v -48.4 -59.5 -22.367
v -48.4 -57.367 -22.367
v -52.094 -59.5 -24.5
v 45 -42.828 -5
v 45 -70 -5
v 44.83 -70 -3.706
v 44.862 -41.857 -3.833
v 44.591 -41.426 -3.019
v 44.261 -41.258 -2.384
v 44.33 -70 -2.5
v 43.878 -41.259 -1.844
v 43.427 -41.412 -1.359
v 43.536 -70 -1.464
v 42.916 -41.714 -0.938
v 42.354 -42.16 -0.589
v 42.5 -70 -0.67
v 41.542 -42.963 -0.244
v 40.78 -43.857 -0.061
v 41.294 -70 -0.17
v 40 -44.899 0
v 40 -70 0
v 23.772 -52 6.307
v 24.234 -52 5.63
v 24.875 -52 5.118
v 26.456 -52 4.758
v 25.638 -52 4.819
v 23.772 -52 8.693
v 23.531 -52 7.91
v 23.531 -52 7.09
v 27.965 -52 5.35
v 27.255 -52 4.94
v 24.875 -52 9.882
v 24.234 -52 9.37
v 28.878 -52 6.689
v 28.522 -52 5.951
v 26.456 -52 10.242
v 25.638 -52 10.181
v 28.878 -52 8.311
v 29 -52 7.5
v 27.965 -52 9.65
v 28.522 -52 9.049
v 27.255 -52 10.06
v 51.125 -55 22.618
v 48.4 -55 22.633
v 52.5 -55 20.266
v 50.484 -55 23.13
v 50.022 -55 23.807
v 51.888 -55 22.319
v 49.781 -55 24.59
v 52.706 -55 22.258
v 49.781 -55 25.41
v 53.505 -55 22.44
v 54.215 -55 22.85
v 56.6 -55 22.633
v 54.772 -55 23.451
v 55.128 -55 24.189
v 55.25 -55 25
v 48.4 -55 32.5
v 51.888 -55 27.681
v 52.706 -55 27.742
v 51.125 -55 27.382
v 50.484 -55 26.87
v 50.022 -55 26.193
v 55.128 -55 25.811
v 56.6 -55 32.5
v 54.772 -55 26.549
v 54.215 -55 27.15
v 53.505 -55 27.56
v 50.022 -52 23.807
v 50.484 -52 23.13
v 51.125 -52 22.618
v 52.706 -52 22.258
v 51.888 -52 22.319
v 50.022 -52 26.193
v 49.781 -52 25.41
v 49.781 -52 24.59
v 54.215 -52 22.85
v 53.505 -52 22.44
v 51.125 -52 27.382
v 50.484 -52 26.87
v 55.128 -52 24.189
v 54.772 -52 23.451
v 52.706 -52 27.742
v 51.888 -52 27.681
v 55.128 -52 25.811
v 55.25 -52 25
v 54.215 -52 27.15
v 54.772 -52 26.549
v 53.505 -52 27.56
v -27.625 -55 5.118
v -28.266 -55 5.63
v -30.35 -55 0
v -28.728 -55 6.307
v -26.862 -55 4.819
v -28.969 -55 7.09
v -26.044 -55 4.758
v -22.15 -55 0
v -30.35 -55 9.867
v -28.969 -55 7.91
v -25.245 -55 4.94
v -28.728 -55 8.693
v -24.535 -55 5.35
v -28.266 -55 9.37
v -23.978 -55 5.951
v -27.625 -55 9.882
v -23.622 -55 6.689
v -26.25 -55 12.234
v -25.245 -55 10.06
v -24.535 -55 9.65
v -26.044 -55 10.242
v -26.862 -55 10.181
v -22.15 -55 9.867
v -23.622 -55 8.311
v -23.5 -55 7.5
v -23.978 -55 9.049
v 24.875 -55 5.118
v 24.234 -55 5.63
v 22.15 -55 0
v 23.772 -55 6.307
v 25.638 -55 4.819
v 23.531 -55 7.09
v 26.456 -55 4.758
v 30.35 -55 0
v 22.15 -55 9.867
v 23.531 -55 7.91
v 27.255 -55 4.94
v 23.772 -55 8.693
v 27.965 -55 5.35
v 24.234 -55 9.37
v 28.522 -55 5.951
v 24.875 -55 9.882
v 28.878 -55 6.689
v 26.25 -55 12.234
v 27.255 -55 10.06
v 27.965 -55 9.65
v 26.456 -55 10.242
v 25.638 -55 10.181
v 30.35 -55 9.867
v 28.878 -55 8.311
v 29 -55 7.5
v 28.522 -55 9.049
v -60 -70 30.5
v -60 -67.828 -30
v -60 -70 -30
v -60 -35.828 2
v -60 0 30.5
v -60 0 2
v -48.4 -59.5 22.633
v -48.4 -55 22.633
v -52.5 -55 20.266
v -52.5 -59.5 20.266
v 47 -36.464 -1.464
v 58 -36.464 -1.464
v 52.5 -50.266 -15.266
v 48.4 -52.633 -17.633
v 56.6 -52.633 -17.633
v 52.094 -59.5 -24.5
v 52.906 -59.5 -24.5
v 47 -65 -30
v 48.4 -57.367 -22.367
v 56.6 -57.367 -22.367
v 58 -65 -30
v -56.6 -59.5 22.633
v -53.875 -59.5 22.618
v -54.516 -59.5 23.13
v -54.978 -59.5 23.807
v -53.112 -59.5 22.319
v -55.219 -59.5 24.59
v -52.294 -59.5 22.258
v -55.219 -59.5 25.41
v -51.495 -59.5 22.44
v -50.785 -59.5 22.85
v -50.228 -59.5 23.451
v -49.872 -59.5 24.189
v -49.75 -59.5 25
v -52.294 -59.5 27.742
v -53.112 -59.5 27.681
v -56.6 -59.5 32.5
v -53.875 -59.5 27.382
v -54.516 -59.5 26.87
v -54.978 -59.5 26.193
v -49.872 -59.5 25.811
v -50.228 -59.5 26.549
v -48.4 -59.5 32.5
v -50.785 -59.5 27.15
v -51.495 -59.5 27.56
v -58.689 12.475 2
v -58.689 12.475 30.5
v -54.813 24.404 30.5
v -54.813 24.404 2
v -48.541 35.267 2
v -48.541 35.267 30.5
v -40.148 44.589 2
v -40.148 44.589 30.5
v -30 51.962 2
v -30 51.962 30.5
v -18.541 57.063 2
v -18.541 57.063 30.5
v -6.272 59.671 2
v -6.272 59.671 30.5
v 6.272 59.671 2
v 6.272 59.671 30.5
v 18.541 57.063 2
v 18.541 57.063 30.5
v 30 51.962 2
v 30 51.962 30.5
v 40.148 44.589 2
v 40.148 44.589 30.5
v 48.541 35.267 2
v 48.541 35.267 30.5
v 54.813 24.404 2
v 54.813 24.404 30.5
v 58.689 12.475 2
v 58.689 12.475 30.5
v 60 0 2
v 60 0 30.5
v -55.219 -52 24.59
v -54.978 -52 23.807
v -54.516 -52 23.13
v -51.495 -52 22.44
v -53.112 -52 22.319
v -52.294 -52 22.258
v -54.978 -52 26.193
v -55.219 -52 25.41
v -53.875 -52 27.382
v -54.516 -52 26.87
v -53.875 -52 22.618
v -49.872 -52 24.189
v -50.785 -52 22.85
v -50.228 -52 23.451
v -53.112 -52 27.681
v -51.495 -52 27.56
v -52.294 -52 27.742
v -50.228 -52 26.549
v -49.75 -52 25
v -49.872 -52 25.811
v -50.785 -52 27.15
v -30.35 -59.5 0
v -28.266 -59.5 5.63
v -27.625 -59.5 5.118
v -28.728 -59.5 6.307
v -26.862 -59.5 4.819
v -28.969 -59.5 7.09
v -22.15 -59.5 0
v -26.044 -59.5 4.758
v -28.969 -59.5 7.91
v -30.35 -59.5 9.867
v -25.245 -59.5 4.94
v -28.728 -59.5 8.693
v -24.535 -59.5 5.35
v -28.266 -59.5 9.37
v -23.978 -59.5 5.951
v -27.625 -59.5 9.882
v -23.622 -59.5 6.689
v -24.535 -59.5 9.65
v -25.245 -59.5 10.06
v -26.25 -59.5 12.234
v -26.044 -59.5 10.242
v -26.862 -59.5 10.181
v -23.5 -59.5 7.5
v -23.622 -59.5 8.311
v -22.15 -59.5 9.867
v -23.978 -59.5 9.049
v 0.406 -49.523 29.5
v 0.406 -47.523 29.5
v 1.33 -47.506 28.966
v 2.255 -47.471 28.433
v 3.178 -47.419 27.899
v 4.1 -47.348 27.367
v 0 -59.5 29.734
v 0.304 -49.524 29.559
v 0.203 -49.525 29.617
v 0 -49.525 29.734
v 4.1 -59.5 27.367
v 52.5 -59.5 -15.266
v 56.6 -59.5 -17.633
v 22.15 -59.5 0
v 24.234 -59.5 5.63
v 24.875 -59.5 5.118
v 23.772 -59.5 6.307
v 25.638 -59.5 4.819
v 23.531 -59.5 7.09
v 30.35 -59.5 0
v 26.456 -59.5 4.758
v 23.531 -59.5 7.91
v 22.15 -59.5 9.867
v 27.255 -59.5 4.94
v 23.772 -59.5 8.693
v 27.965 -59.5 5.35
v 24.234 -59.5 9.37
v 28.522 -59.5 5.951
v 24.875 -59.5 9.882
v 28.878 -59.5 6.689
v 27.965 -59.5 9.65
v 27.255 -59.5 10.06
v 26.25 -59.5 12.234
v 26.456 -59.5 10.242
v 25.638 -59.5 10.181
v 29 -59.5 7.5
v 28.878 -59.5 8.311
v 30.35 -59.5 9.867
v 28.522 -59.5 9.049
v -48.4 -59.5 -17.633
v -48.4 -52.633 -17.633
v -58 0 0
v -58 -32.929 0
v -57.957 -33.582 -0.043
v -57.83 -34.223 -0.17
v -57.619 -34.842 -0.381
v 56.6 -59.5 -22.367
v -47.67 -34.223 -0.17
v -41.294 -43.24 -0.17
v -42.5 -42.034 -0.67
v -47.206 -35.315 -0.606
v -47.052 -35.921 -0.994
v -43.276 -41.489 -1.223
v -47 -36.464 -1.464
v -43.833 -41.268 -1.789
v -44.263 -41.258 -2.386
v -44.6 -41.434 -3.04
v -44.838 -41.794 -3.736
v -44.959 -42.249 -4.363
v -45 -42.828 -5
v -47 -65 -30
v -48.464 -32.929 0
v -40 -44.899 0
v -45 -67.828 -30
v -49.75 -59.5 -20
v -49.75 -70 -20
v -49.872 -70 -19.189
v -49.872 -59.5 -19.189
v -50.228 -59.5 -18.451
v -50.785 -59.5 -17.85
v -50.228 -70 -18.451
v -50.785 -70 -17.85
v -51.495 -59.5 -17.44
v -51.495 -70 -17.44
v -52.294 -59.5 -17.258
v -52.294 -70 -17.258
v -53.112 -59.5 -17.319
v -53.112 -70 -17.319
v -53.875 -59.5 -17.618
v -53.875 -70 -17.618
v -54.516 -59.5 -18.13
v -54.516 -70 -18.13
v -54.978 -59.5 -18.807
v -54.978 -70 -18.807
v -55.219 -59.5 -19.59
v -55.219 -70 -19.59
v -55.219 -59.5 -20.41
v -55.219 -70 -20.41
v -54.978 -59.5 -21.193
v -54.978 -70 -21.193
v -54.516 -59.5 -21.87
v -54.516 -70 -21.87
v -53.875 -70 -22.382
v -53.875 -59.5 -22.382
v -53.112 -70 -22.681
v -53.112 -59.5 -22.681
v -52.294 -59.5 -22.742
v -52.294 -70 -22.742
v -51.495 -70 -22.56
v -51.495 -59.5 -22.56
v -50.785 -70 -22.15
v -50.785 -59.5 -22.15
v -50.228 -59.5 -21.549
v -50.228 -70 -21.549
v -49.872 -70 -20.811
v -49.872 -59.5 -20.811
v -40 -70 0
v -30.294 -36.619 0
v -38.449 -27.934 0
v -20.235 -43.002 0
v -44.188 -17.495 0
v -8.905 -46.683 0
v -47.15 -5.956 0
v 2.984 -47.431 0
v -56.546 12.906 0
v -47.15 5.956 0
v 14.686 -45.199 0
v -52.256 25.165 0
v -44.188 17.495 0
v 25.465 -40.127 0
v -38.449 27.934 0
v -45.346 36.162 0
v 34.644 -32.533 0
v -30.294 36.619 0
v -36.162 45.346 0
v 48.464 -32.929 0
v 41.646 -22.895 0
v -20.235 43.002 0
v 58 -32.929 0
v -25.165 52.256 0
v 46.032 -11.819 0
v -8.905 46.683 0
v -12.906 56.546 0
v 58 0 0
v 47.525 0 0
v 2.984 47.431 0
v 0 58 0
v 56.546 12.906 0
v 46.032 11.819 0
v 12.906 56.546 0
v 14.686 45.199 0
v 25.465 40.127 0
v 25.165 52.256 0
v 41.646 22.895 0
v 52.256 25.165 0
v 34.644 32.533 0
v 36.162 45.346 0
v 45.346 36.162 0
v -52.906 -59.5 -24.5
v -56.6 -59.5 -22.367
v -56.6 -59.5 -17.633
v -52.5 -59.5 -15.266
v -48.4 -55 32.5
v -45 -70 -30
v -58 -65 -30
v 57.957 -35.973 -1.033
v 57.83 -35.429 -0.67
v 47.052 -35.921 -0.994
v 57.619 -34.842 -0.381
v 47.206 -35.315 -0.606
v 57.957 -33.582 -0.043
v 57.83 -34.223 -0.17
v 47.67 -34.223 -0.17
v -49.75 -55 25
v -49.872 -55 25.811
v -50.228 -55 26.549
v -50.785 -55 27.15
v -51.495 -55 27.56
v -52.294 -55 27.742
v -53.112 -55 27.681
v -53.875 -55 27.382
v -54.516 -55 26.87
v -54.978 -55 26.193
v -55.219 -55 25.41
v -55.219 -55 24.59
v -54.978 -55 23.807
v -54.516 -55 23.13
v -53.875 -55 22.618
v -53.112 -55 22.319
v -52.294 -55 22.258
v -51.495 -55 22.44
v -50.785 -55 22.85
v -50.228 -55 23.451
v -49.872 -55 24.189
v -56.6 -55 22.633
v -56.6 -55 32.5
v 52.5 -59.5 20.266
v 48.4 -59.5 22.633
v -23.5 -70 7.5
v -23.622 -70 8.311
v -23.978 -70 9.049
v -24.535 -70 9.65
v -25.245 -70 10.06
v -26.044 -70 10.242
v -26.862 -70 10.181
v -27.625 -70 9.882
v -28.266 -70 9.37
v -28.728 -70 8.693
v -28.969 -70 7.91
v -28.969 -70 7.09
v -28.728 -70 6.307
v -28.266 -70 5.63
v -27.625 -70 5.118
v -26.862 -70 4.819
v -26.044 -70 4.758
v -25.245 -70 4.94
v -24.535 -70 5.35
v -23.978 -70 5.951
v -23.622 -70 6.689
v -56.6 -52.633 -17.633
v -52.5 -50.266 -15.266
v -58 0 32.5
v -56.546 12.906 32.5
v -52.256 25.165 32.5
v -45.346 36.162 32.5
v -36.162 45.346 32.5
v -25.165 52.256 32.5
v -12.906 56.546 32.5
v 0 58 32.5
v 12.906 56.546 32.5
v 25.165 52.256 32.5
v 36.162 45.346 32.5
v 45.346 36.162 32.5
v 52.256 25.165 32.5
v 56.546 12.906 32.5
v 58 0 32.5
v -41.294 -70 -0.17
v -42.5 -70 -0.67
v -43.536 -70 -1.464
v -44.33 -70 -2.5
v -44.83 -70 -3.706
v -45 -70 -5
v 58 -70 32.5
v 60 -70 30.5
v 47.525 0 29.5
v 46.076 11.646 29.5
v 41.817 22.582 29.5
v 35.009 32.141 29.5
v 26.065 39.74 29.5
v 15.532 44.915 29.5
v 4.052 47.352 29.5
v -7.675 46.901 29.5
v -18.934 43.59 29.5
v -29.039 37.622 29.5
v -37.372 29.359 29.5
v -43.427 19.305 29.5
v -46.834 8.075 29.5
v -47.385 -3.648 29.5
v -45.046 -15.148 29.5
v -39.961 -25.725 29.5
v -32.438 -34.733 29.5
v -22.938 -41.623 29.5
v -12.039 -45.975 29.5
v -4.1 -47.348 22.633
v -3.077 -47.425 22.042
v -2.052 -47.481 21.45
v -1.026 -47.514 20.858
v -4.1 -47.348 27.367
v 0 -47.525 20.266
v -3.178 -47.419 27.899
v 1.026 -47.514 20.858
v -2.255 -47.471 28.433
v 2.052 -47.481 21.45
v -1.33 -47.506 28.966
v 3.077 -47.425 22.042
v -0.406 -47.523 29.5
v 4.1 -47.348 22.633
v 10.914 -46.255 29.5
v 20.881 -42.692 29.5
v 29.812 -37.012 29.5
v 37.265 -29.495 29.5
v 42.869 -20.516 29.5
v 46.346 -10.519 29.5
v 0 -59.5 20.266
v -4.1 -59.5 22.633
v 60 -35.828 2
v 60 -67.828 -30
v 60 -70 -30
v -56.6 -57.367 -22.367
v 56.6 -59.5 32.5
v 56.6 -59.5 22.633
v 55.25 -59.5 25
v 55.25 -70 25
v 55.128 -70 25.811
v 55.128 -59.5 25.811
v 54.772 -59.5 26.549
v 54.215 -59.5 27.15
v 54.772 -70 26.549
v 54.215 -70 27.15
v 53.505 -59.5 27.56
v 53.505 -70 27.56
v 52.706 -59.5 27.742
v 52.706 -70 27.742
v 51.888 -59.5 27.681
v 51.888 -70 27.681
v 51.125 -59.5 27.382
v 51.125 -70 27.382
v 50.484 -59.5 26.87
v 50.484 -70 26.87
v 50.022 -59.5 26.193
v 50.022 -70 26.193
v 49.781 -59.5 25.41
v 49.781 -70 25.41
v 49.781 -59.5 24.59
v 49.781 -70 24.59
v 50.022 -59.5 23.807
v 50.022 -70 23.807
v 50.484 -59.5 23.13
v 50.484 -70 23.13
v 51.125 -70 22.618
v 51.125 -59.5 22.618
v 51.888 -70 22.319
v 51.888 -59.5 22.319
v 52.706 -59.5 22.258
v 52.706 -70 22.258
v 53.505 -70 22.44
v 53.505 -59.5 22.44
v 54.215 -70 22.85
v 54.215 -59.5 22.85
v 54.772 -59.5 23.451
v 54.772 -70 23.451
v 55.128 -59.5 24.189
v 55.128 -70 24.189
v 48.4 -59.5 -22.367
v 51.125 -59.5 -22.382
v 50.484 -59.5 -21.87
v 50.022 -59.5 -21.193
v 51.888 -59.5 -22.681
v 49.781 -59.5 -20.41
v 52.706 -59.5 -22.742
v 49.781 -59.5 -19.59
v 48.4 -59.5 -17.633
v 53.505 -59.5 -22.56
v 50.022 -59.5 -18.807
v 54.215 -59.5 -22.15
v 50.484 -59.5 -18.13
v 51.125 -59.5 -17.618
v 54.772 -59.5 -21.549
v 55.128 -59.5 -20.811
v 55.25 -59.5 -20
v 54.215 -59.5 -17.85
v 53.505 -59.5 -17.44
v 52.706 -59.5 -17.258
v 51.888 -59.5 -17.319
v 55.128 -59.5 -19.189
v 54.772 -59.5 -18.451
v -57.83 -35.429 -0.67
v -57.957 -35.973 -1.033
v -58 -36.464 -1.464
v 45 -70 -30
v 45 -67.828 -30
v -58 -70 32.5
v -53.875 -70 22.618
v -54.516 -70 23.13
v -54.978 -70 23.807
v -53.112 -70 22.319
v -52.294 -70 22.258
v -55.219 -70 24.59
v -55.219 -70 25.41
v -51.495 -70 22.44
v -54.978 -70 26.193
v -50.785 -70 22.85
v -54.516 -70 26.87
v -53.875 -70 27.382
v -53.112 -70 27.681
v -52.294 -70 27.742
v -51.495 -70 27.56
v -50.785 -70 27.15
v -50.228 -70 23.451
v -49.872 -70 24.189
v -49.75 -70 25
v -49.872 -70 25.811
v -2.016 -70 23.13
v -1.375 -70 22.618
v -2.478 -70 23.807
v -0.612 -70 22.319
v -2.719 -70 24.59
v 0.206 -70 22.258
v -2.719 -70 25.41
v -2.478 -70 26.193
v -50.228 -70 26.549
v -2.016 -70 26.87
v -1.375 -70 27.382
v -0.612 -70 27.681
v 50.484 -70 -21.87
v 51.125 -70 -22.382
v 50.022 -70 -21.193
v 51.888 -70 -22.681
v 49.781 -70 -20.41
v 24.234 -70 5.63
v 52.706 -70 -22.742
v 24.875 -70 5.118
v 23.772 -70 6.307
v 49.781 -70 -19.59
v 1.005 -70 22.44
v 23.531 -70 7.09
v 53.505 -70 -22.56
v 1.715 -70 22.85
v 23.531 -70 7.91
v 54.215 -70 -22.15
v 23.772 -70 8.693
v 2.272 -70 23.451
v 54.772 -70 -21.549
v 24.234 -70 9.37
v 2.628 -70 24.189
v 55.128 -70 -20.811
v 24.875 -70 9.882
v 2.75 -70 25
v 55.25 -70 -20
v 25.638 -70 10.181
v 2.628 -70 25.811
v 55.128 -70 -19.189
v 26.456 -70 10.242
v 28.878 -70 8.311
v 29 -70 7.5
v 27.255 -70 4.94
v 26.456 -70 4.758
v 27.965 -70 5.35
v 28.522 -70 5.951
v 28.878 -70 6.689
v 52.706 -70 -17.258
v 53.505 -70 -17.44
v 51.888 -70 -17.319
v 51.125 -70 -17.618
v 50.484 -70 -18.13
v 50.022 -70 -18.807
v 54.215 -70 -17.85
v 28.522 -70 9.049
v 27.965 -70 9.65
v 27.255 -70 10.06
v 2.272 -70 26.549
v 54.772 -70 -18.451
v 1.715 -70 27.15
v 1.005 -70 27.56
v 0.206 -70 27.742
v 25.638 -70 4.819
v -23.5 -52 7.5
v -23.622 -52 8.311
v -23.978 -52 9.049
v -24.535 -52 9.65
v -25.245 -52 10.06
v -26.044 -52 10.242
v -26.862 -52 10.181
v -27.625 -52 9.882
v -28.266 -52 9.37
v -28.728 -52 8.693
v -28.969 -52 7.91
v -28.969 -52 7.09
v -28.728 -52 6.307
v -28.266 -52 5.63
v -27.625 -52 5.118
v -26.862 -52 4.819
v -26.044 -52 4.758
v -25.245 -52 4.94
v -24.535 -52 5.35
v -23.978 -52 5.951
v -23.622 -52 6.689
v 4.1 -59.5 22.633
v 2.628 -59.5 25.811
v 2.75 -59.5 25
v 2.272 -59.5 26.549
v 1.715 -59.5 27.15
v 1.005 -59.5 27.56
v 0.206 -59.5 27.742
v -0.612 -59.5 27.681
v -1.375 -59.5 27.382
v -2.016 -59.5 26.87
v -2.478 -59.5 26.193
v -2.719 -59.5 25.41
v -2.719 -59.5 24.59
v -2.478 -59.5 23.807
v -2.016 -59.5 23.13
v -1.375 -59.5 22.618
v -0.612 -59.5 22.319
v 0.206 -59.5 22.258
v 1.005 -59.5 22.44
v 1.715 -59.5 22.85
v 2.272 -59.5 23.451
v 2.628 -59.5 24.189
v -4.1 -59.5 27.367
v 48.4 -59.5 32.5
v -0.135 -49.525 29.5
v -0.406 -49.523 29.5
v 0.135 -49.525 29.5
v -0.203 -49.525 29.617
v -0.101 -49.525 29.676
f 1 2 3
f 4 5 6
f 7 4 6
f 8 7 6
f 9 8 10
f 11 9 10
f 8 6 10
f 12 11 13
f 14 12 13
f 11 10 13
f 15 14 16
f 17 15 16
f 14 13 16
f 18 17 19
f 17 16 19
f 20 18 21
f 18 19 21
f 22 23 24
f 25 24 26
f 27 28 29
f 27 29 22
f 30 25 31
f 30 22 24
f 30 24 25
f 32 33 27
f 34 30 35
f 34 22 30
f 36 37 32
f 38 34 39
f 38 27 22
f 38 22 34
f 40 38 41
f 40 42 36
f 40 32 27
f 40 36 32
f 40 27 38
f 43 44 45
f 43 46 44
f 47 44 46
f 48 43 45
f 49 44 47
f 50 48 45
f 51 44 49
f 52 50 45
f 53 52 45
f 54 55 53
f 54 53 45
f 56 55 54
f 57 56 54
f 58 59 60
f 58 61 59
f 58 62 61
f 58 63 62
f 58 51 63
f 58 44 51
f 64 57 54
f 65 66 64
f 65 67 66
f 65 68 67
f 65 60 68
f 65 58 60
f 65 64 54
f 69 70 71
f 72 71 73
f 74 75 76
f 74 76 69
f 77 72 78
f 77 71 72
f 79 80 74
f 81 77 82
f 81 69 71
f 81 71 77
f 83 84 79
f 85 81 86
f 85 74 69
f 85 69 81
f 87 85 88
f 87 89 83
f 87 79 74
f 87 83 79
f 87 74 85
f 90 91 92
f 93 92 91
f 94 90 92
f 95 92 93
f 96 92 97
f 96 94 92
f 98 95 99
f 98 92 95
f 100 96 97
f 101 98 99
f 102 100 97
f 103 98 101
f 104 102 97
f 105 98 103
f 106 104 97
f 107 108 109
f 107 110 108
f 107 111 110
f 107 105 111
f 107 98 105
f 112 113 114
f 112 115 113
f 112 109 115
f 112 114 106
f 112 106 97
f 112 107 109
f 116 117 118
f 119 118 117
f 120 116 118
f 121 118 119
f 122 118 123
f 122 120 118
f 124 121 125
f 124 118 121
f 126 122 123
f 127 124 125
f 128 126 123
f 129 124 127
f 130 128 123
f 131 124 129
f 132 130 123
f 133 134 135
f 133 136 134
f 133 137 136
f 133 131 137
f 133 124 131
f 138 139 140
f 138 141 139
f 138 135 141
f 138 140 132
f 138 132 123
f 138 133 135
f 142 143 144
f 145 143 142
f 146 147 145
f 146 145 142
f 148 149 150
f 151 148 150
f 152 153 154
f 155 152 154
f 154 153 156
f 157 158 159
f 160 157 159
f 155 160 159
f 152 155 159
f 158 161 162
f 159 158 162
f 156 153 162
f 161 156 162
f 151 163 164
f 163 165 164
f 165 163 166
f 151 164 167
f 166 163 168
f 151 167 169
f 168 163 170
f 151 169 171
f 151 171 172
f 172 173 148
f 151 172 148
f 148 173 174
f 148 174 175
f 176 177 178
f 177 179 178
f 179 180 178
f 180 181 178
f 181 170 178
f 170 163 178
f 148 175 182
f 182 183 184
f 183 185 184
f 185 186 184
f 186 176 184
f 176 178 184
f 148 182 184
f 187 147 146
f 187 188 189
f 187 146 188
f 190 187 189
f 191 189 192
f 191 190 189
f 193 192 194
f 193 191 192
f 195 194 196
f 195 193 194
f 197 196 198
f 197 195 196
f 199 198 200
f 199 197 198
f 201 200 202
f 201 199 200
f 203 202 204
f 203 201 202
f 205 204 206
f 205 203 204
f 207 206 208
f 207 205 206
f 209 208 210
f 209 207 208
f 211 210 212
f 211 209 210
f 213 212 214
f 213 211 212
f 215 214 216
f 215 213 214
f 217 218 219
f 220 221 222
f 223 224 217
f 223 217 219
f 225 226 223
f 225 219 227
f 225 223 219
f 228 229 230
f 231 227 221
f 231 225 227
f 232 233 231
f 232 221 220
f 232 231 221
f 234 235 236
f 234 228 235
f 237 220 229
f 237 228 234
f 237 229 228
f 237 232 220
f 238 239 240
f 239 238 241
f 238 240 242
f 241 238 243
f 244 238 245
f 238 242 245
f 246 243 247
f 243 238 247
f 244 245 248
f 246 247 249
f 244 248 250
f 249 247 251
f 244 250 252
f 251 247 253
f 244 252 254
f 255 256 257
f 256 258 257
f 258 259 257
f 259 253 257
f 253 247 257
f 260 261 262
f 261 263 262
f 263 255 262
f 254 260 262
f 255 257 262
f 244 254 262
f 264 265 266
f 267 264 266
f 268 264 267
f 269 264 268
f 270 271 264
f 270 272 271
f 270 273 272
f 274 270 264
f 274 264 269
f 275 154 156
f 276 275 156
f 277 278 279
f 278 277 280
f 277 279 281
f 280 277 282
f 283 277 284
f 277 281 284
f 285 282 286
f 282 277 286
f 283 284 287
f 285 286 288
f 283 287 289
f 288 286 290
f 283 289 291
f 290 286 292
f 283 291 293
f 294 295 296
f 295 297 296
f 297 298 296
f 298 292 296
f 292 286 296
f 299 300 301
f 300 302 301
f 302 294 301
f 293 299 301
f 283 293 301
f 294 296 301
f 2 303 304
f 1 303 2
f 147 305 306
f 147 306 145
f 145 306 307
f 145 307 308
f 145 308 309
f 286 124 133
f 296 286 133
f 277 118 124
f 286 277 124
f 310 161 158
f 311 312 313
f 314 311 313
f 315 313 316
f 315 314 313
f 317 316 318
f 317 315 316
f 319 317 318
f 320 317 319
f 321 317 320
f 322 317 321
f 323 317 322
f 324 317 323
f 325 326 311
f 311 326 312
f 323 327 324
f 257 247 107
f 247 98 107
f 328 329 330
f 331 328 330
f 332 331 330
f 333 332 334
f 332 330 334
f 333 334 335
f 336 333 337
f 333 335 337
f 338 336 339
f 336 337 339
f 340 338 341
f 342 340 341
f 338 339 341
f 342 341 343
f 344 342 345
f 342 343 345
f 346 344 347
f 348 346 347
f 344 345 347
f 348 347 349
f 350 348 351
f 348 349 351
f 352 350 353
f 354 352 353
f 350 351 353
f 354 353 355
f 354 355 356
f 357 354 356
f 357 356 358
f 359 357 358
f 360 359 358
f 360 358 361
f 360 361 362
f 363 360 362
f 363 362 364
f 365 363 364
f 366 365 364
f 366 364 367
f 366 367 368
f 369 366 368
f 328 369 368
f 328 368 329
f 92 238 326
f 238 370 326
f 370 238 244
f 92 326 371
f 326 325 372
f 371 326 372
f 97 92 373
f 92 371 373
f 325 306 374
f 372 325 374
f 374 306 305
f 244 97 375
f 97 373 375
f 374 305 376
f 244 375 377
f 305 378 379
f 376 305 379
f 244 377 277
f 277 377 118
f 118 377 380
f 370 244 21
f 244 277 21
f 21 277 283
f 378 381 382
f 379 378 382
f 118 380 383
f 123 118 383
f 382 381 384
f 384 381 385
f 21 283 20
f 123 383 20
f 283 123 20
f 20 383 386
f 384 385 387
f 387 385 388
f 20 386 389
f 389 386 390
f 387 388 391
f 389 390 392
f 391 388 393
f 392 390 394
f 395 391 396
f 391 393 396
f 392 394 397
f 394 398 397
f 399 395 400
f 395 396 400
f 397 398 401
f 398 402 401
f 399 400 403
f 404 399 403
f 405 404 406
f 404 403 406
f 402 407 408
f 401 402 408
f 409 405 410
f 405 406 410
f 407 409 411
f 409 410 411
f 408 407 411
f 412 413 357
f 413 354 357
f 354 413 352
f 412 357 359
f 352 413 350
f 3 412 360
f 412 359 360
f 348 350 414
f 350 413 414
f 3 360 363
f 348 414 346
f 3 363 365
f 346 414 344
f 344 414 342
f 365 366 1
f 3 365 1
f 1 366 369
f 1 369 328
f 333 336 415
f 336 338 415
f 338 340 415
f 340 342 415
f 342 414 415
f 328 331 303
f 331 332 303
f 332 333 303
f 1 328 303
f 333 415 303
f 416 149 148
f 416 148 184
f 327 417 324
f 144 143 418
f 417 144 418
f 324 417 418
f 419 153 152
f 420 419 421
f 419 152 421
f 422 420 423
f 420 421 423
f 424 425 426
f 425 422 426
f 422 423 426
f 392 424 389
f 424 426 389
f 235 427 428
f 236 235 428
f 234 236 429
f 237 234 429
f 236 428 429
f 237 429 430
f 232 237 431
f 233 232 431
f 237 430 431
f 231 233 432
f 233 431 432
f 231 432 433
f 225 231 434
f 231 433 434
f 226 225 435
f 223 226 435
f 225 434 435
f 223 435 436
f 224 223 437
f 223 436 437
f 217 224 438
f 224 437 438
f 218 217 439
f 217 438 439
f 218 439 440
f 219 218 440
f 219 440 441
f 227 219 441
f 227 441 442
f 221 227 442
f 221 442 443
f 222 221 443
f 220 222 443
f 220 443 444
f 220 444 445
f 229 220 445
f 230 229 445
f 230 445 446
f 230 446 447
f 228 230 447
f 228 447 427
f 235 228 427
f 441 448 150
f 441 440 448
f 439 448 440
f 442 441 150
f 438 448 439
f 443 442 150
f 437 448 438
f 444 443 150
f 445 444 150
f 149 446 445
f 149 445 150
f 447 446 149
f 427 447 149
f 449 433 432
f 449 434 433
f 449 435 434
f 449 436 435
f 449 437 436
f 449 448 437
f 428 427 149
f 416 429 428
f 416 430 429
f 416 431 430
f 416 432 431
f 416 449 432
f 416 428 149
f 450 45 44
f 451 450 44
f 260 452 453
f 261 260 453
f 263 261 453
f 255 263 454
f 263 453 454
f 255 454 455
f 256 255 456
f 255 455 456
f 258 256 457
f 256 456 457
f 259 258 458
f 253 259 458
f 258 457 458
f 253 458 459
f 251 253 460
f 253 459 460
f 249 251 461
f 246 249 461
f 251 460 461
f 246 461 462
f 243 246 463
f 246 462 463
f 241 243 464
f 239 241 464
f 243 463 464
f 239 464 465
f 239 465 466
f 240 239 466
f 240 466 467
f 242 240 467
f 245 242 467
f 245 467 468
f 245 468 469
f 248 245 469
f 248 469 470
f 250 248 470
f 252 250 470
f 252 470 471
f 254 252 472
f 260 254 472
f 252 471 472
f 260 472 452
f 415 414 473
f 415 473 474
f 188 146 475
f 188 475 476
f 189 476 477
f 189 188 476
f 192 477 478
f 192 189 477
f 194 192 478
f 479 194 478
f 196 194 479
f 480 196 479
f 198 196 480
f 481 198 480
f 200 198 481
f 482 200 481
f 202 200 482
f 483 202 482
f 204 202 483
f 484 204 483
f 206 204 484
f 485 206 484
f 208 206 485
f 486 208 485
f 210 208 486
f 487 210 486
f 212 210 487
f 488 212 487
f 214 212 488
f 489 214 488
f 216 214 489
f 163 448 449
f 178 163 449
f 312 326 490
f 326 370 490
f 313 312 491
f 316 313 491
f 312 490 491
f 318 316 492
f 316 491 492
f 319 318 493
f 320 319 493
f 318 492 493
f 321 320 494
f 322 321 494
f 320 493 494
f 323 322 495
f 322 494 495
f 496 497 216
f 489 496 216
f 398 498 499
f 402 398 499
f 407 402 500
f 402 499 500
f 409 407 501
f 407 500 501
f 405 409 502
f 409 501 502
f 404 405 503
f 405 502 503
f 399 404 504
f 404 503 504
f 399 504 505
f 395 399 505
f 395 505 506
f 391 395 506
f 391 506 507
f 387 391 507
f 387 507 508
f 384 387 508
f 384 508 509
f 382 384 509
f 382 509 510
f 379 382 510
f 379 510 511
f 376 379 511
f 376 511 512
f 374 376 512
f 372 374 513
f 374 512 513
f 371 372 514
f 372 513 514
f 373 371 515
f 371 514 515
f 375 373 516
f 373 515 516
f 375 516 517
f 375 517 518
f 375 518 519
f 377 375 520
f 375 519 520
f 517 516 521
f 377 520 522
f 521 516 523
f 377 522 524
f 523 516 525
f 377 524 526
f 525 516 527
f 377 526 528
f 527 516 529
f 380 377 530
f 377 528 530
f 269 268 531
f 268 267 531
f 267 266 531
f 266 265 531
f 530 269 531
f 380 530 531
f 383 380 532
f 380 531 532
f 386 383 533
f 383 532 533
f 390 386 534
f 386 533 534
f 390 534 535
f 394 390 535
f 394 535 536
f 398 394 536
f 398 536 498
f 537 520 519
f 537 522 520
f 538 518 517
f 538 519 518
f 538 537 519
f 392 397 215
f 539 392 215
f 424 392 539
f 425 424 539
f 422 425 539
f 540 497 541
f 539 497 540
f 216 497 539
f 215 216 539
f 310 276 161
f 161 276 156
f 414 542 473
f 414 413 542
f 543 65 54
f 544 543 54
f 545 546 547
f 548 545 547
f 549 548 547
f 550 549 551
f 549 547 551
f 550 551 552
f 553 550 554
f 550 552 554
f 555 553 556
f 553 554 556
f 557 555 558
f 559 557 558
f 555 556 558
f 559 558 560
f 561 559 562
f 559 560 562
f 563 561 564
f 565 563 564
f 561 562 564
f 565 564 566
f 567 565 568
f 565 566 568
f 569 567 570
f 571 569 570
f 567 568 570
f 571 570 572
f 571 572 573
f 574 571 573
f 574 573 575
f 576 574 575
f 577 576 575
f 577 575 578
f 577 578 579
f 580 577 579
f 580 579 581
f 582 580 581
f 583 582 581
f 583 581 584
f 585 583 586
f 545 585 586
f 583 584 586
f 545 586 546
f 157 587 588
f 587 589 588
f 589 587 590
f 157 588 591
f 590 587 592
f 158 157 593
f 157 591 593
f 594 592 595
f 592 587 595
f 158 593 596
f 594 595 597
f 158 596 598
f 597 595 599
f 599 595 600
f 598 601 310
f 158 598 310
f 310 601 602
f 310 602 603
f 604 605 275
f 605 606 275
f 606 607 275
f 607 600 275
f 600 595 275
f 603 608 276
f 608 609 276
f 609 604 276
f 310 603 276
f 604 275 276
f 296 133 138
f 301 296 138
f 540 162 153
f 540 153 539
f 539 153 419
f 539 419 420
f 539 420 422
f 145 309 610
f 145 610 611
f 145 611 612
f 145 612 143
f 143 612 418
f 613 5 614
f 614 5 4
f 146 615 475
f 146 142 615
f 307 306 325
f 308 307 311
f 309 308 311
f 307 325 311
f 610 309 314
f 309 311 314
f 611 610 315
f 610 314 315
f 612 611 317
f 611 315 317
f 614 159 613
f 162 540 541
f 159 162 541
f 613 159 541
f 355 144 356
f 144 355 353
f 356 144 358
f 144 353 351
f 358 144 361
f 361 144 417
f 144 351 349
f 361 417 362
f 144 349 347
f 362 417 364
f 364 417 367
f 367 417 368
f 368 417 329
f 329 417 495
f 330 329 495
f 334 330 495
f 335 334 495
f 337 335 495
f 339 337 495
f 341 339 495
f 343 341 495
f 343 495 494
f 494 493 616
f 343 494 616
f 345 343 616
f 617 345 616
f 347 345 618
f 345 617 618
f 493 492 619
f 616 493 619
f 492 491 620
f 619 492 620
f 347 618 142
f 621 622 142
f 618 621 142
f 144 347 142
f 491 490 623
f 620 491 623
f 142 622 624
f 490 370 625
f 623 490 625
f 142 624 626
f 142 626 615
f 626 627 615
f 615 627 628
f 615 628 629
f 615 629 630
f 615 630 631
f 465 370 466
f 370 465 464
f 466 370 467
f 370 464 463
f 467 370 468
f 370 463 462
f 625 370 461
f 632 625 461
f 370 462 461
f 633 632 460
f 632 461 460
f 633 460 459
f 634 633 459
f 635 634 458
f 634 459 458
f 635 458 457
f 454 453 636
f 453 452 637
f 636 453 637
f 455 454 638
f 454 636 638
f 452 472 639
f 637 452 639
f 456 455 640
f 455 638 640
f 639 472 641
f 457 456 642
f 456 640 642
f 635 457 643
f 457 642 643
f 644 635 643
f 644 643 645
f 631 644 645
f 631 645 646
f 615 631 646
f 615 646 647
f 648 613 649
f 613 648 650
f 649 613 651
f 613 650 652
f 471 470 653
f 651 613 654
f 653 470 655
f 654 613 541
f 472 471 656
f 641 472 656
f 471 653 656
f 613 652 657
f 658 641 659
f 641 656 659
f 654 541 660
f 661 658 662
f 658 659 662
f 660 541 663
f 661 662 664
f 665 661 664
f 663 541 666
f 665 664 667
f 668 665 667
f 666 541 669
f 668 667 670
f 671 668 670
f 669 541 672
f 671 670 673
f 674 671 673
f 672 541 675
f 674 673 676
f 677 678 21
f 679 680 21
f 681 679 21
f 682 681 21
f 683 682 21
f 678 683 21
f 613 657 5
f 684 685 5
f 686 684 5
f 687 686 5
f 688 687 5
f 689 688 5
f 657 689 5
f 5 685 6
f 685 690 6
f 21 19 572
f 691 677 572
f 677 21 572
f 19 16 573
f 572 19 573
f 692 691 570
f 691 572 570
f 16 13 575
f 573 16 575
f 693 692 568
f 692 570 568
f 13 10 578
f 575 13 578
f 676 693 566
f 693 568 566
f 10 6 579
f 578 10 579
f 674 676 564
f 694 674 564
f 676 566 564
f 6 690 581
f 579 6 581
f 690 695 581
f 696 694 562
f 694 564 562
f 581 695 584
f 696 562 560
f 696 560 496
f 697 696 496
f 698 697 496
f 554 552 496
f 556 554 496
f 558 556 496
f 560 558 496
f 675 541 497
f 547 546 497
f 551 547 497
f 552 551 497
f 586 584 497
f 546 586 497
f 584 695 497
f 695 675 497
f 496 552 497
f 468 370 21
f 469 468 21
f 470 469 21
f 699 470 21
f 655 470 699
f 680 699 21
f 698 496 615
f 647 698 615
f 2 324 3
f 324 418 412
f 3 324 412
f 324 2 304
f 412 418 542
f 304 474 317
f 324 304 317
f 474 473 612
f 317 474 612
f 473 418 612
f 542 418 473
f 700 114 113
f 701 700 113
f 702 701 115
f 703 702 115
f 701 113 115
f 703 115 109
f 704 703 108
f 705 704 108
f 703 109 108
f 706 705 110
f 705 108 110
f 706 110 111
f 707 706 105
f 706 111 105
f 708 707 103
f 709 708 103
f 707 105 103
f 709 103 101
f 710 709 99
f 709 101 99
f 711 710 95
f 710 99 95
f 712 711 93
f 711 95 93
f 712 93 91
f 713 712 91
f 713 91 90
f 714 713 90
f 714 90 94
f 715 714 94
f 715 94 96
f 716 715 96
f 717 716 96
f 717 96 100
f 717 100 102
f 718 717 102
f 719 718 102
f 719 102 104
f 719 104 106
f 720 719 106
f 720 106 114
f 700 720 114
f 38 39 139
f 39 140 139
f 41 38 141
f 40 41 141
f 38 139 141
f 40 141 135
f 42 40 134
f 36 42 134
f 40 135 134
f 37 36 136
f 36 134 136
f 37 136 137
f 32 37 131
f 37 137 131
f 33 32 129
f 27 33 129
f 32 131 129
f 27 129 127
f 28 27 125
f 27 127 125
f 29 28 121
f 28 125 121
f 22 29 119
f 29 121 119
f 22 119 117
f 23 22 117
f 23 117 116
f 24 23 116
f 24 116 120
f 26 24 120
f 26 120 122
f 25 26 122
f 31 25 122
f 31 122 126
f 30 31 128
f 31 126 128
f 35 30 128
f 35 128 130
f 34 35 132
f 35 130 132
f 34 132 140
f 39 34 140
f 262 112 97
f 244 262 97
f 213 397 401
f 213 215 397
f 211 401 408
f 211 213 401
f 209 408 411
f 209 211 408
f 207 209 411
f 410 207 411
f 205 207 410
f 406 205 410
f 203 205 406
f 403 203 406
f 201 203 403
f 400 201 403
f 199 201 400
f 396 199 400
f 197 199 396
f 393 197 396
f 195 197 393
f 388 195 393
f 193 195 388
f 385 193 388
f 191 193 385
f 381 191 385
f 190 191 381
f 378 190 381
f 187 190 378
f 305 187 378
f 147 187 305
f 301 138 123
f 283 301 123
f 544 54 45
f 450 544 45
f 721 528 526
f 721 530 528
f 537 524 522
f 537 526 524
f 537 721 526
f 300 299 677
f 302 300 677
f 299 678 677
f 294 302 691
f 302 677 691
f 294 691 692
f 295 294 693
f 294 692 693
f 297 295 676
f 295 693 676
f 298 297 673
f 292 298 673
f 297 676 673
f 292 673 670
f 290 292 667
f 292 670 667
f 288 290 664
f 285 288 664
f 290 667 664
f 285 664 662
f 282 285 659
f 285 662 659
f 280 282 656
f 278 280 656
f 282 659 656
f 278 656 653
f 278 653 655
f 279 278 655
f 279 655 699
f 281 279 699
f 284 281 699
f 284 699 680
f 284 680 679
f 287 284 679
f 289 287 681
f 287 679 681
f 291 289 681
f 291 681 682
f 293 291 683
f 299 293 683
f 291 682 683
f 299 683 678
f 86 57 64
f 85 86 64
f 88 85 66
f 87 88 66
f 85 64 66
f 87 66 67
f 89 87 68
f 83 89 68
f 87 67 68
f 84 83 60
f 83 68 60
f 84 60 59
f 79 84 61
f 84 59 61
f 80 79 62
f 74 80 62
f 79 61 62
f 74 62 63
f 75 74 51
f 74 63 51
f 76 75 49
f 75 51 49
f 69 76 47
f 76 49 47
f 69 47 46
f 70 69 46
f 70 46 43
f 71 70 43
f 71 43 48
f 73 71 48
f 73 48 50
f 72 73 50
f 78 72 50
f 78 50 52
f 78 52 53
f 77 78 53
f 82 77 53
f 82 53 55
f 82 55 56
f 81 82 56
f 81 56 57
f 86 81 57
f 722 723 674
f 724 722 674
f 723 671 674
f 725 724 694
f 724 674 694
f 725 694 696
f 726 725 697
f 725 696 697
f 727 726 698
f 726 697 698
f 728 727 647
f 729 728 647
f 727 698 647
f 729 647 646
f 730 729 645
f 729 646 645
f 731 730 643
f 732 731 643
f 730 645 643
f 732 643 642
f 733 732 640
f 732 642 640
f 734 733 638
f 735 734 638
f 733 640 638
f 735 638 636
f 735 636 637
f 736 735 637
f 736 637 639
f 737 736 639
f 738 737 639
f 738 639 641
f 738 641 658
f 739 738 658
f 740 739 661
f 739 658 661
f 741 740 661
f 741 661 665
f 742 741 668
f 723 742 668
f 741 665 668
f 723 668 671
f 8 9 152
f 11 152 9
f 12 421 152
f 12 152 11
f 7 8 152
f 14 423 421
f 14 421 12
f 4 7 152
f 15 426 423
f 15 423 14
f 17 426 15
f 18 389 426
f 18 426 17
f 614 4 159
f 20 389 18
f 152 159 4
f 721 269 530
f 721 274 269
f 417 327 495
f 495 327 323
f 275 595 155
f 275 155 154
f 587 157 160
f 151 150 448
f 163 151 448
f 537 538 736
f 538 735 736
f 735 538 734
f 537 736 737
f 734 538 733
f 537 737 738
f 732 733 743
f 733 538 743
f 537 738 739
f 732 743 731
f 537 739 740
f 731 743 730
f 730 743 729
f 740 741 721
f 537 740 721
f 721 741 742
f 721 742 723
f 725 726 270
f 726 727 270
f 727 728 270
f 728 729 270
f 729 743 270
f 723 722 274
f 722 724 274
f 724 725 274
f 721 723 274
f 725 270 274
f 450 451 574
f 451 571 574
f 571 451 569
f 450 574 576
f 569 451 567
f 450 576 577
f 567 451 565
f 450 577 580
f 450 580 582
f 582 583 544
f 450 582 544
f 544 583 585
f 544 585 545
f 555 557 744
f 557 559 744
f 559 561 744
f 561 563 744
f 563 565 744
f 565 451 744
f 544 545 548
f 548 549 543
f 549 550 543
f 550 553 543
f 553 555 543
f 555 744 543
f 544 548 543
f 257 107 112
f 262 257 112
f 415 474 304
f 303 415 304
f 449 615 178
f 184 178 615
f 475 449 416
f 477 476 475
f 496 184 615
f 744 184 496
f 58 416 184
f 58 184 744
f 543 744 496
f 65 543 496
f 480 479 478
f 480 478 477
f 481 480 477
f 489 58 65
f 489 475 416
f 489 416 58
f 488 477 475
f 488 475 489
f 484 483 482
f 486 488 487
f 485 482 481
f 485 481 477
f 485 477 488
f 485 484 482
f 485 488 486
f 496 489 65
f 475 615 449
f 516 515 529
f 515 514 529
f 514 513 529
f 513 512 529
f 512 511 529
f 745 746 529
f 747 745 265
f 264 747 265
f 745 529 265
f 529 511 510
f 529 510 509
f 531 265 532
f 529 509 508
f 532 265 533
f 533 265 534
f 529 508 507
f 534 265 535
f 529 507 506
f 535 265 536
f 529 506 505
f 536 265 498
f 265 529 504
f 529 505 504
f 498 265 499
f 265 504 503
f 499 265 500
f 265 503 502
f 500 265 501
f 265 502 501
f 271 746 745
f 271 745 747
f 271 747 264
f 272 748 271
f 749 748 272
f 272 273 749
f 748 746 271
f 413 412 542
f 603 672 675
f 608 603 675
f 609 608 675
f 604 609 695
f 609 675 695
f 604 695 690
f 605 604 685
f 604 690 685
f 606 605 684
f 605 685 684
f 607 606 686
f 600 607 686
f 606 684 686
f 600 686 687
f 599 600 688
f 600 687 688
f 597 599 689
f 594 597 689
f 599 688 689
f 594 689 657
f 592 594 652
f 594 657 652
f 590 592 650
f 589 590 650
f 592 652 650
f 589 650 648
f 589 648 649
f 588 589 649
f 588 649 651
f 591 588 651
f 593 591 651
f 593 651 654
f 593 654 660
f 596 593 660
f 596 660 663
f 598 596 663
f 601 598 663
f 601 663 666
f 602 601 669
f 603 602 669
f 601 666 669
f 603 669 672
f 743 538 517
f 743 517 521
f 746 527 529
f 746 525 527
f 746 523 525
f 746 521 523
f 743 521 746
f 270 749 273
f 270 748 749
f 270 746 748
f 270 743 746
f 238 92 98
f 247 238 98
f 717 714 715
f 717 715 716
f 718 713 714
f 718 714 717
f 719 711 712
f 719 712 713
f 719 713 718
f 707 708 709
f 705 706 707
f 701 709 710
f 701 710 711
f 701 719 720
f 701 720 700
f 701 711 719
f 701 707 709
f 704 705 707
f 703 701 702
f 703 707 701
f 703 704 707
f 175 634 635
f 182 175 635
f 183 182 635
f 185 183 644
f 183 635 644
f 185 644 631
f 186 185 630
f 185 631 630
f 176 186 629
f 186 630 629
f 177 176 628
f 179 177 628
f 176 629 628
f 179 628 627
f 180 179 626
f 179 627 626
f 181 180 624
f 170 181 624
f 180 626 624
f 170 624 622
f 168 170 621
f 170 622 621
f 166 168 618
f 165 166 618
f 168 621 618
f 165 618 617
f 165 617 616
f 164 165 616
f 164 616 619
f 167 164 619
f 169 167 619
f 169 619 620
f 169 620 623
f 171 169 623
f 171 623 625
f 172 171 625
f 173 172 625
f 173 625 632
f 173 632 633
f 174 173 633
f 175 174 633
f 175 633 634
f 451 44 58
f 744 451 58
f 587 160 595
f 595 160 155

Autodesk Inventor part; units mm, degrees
ref_plane "YZ Plane" through (0, 0, 0) normal (1, 0, 0) x (0, 1, 0)
ref_plane "XZ Plane" through (0, 0, 0) normal (0, 1, 0) x (-1, 0, 0)
sketch "Sketch1" plane through (0, 0, 0) normal (0, 0, 1) x (1, 0, 0)
  circle A0 centre (0, 0) radius 47.525
  arc A1 (60, 0) -> (-60, 0) centre (0, 0) ccw
  line L0 (-60, 0) -> (-60, -70)
  line L1 (-60, -70) -> (60, -70)
  line L2 (60, -70) -> (60, 0)
  dimension "d0" = 95.05
  dimension "d2" = 70
  dimension "d43" = 60
extrude "Extrusion1" add sketch "Sketch1" along normal blind 32.5
sketch "Sketch2" plane through (0, 0, 0) normal (0, 0, -1) x (-1, 0, 0)
  circle A0 centre (0, 0) radius 47.525 projected
  circle A1 centre (0, 0) radius 45.525
  dimension "d5" = 2
extrude "Extrusion2" add sketch "Sketch2" against normal blind 1
sketch "Sketch3" plane through (0, 0, 32.5) normal (0, 0, 1) x (1, 0, 0)
  arc A0 (60, 0) -> (-60, 0) centre (0, 0) ccw construction
  line L0 (0, 0) -> (0, 55) construction
  circle A1 centre (0, 55) radius 2.6
  circle A2 centre (-52.3081, 16.9959) radius 2.6
  circle A3 centre (-32.3282, -44.4959) radius 2.6
  circle A4 centre (32.3282, -44.4959) radius 2.6
  circle A5 centre (52.3081, 16.9959) radius 2.6
  dimension "d8" = 5.2
  dimension "d9" = 55
  dimension "d12" = 360
extrude "Extrusion3" cut sketch "Sketch3" against normal through all
sketch "Sketch7" plane through (-60, -70, 0) normal (-1, 0, 0) x (0, 0, 1)
  line L0 (0, 0) -> (32.5, 0) projected
  line L1 (0, 0) -> (-30, 0)
  line L2 (-30, 0) -> (-30, 5)
  line L3 (0, 70) -> (0, 0) projected
  line L4 (-30, 5) -> (0, 35)
  line L5 (0, 0) -> (0, 35)
  dimension "d32" = 30
  dimension "d33" = 5
  dimension "d34" = 135
extrude "Extrusion7" add sketch "Sketch7" against normal blind 15
mirror "Mirror1" about plane through (0, 0, 0) normal (1, 0, 0) of "Extrusion7"
sketch "Sketch5" plane through (-60, -70, 0) normal (0, -1, 0) x (1, 0, 0)
  circle A0 centre (7.5, 25) radius 2.75
  circle A1 centre (112.5, 25) radius 2.75
  circle A2 centre (86.25, 7.5) radius 2.75
  circle A3 centre (33.75, 7.5) radius 2.75
  circle A4 centre (60, 25) radius 2.75
  line L0 (7.5, 25) -> (60, 25) construction
  line L1 (60, 25) -> (112.5, 25) construction
  line L2 (86.25, 7.5) -> (33.75, 7.5) construction
  line L3 (60, 25) -> (60, 7.5) construction
  line L4 (60, 7.5) -> (60, 0) construction
  line L5 (0, 0) -> (120, 0) construction
  line L6 (0, 32.5) -> (120, 32.5) construction
  line L7 (0, 0) -> (0, 32.5) construction
  line L8 (33.75, 25) -> (33.75, 7.5) construction
  line L9 (0, -30) -> (15, -30) construction
  line L10 (7.5, -30) -> (7.5, -20) construction
  line L11 (120, -30) -> (105, -30) construction
  line L12 (112.5, -30) -> (112.5, -20) construction
  line L13 (112.5, -20) -> (7.5, -20) construction
  circle A5 centre (7.5, -20) radius 2.75
  circle A6 centre (112.5, -20) radius 2.75
  line L14 (112.5, -20) -> (112.5, 25) construction
  line L15 (120, -30) -> (120, 32.5) projected
  dimension "d16" = 5.5
  dimension "d17" = 7.5
  dimension "d18" = 7.5
  dimension "d37" = 10
  dimension "d39" = 17.5
  dimension "d45" = 52.5
  dimension "d46" = 45
  dimension "d47" = 7.5
extrude "Extrusion4" cut sketch "Sketch5" against normal blind 18
ref_plane "Work Plane1" through (-60, -55, 0) normal (0, -1, 0) x (1, 0, 0)
sketch "Sketch6" plane through (-60, -55, 0) normal (0, -1, 0) x (1, 0, 0)
  circle A0 centre (112.5, 25) radius 2.75 projected
  circle A1 centre (60, 25) radius 2.75 projected
  circle A2 centre (33.75, 7.5) radius 2.75 projected
  line L0 (112.5, 29.7343) -> (116.6, 27.3671) construction
  line L1 (116.6, 27.3671) -> (116.6, 22.6329)
  line L2 (116.6, 22.6329) -> (112.5, 20.2657)
  line L3 (112.5, 20.2657) -> (108.4, 22.6329)
  line L4 (108.4, 22.6329) -> (108.4, 27.3671)
  line L5 (108.4, 27.3671) -> (112.5, 29.7343) construction
  line L6 (60, 29.7343) -> (64.1, 27.3671)
  line L7 (64.1, 27.3671) -> (64.1, 22.6329)
  line L8 (64.1, 22.6329) -> (60, 20.2657)
  line L9 (60, 20.2657) -> (55.9, 22.6329)
  line L10 (55.9, 22.6329) -> (55.9, 27.3671)
  line L11 (55.9, 27.3671) -> (60, 29.7343)
  circle A3 centre (33.75, 7.5) radius 2.75 projected
  line L12 (33.75, 2.7657) -> (29.65, 5.1329) construction
  line L13 (29.65, 5.1329) -> (29.65, 9.8671)
  line L14 (29.65, 9.8671) -> (33.75, 12.2343)
  line L15 (33.75, 12.2343) -> (37.85, 9.8671)
  line L16 (37.85, 9.8671) -> (37.85, 5.1329)
  line L17 (37.85, 5.1329) -> (33.75, 2.7657) construction
  circle A4 centre (86.25, 7.5) radius 2.75 projected
  line L18 (86.25, 2.7657) -> (82.15, 5.1329) construction
  line L19 (82.15, 5.1329) -> (82.15, 9.8671)
  line L20 (82.15, 9.8671) -> (86.25, 12.2343)
  line L21 (86.25, 12.2343) -> (90.35, 9.8671)
  line L22 (90.35, 9.8671) -> (90.35, 5.1329)
  line L23 (90.35, 5.1329) -> (86.25, 2.7657) construction
  circle A5 centre (7.5, 25) radius 2.75 projected
  line L24 (7.5, 20.2657) -> (3.4, 22.6329)
  line L25 (3.4, 22.6329) -> (3.4, 27.3671)
  line L26 (3.4, 27.3671) -> (7.5, 29.7343) construction
  line L27 (7.5, 29.7343) -> (11.6, 27.3671) construction
  line L28 (11.6, 27.3671) -> (11.6, 22.6329)
  line L29 (11.6, 22.6329) -> (7.5, 20.2657)
  line L30 (116.6, 27.3671) -> (116.6, 35.5137)
  line L31 (116.6, 35.5137) -> (108.4, 35.5137)
  line L32 (108.4, 35.5137) -> (108.4, 27.3671)
  line L33 (90.35, 5.1329) -> (90.35, -3.3085)
  line L34 (90.35, -3.3085) -> (82.15, -3.3085)
  line L35 (82.15, -3.3085) -> (82.15, 5.1329)
  line L36 (37.85, 5.1329) -> (37.85, -3.965)
  line L37 (37.85, -3.965) -> (29.65, -3.965)
  line L38 (29.65, -3.965) -> (29.65, 5.1329)
  line L39 (12.475, 1) -> (107.525, 1) projected
  line L40 (11.6, 27.3671) -> (11.6, 33.5607)
  line L41 (11.6, 33.5607) -> (3.4, 33.5607)
  line L42 (3.4, 33.5607) -> (3.4, 27.3671)
  circle A6 centre (112.5, -20) radius 2.75 projected
  circle A7 centre (112.5, -20) radius 2.75 projected
  circle A8 centre (7.5, -20) radius 2.75 projected
  line L43 (112.5, -24.7343) -> (108.4, -22.3671)
  line L44 (108.4, -22.3671) -> (108.4, -17.6329)
  line L45 (108.4, -17.6329) -> (112.5, -15.2657)
  line L46 (112.5, -15.2657) -> (116.6, -17.6329)
  line L47 (116.6, -17.6329) -> (116.6, -22.3671)
  line L48 (116.6, -22.3671) -> (112.5, -24.7343)
  line L49 (7.5, -24.7343) -> (3.4, -22.3671)
  line L50 (3.4, -22.3671) -> (3.4, -17.6329)
  line L51 (3.4, -17.6329) -> (7.5, -15.2657)
  line L52 (7.5, -15.2657) -> (11.6, -17.6329)
  line L53 (11.6, -17.6329) -> (11.6, -22.3671)
  line L54 (11.6, -22.3671) -> (7.5, -24.7343)
  point P0 (60, 0)
  point P1 (60, 25)
  point P2 (33.75, 7.5)
  point P3 (7.5, 25)
  point P4 (37.85, 1)
  point P5 (29.65, 1)
  point P6 (90.35, 1)
  point P7 (82.15, 1)
  point P8 (7.5, -20)
  dimension "d23" = 8.2
extrude "Extrusion5" cut sketch "Sketch6" along normal blind 4.5 contours A1 | L1 L2 L3 L4 L32 L31 L30 | L6 L7 L8 L9 L10 L11 | L35 L19 L20 L21 L22 L33 L39 | L39 L33 L34 L35 | L13 L14 L15 L16 L36 L39 L38 | L39 L36 L37 L38 | L24 L25 L42 L41 L40 L28 L29 | L43 L44 L45 L46 L47 L48 | L49 L50 L51 L52 L53 L54
extrude "Extrusion6" cut sketch "Sketch6" against normal blind 20.75 contours A1 | L6 L7 L8 L9 L10 L11 | L43 L44 L45 L46 L47 L48 | L49 L50 L51 L52 L53 L54
fillet "Fillet1" radius 2 1 edges at (-47.525, 0, 32.5)
chamfer "Chamfer1" distance 2 angle 45 10 edges at (0, 60, 32.5) (-60, -35, 32.5) (60, -35, 32.5) (0, 60, 0) (-60, -17.5, 0) (60, -17.5, 0) (-60, -50, -15) (-45, -50, -15) (45, -50, -15) (60, -50, -15)
fillet "Fillet2" radius 5 4 edges at (-45, -53.9142, 0) (45, -53.9142, 0) (52.5, -35, 0) (-52.5, -35, 0)
chamfer "Chamfer2" distance 2 angle 45 1 edges at (-47.525, 0, 1)
sketch "Sketch9" plane through (0, 0, 32.5) normal (0, 0, 1) x (1, 0, 0)
  circle A0 centre (0, 0) radius 47.525 projected
  circle A1 centre (0, 0) radius 47.525 projected
extrude "Extrusion8" cut sketch "Sketch9" against normal through all
sketch "Sketch10" plane through (0, 0, 32.5) normal (0, 0, 1) x (1, 0, 0)
  circle A0 centre (-32.3282, -44.4959) radius 2.6 projected
  circle A1 centre (-52.3081, 16.9959) radius 2.6 projected
  circle A2 centre (0, 55) radius 2.6 projected
  circle A3 centre (52.3081, 16.9959) radius 2.6 projected
  circle A4 centre (32.3282, -44.4959) radius 2.6 projected
  point P0 (0, 0)
extrude "Extrusion9" add sketch "Sketch10" against normal up to surface (32.5 mm away)
sketch "Sketch11" plane through (0, 0, 32.5) normal (0, 0, 1) x (1, 0, 0)
  circle A0 centre (0, 0) radius 49.525 projected
extrude "Extrusion10" add sketch "Sketch11" against normal blind 3
equation "\"d17\" = d47"
equation "\"d18\" = d47"
properties part number "J1_idlebracket"
